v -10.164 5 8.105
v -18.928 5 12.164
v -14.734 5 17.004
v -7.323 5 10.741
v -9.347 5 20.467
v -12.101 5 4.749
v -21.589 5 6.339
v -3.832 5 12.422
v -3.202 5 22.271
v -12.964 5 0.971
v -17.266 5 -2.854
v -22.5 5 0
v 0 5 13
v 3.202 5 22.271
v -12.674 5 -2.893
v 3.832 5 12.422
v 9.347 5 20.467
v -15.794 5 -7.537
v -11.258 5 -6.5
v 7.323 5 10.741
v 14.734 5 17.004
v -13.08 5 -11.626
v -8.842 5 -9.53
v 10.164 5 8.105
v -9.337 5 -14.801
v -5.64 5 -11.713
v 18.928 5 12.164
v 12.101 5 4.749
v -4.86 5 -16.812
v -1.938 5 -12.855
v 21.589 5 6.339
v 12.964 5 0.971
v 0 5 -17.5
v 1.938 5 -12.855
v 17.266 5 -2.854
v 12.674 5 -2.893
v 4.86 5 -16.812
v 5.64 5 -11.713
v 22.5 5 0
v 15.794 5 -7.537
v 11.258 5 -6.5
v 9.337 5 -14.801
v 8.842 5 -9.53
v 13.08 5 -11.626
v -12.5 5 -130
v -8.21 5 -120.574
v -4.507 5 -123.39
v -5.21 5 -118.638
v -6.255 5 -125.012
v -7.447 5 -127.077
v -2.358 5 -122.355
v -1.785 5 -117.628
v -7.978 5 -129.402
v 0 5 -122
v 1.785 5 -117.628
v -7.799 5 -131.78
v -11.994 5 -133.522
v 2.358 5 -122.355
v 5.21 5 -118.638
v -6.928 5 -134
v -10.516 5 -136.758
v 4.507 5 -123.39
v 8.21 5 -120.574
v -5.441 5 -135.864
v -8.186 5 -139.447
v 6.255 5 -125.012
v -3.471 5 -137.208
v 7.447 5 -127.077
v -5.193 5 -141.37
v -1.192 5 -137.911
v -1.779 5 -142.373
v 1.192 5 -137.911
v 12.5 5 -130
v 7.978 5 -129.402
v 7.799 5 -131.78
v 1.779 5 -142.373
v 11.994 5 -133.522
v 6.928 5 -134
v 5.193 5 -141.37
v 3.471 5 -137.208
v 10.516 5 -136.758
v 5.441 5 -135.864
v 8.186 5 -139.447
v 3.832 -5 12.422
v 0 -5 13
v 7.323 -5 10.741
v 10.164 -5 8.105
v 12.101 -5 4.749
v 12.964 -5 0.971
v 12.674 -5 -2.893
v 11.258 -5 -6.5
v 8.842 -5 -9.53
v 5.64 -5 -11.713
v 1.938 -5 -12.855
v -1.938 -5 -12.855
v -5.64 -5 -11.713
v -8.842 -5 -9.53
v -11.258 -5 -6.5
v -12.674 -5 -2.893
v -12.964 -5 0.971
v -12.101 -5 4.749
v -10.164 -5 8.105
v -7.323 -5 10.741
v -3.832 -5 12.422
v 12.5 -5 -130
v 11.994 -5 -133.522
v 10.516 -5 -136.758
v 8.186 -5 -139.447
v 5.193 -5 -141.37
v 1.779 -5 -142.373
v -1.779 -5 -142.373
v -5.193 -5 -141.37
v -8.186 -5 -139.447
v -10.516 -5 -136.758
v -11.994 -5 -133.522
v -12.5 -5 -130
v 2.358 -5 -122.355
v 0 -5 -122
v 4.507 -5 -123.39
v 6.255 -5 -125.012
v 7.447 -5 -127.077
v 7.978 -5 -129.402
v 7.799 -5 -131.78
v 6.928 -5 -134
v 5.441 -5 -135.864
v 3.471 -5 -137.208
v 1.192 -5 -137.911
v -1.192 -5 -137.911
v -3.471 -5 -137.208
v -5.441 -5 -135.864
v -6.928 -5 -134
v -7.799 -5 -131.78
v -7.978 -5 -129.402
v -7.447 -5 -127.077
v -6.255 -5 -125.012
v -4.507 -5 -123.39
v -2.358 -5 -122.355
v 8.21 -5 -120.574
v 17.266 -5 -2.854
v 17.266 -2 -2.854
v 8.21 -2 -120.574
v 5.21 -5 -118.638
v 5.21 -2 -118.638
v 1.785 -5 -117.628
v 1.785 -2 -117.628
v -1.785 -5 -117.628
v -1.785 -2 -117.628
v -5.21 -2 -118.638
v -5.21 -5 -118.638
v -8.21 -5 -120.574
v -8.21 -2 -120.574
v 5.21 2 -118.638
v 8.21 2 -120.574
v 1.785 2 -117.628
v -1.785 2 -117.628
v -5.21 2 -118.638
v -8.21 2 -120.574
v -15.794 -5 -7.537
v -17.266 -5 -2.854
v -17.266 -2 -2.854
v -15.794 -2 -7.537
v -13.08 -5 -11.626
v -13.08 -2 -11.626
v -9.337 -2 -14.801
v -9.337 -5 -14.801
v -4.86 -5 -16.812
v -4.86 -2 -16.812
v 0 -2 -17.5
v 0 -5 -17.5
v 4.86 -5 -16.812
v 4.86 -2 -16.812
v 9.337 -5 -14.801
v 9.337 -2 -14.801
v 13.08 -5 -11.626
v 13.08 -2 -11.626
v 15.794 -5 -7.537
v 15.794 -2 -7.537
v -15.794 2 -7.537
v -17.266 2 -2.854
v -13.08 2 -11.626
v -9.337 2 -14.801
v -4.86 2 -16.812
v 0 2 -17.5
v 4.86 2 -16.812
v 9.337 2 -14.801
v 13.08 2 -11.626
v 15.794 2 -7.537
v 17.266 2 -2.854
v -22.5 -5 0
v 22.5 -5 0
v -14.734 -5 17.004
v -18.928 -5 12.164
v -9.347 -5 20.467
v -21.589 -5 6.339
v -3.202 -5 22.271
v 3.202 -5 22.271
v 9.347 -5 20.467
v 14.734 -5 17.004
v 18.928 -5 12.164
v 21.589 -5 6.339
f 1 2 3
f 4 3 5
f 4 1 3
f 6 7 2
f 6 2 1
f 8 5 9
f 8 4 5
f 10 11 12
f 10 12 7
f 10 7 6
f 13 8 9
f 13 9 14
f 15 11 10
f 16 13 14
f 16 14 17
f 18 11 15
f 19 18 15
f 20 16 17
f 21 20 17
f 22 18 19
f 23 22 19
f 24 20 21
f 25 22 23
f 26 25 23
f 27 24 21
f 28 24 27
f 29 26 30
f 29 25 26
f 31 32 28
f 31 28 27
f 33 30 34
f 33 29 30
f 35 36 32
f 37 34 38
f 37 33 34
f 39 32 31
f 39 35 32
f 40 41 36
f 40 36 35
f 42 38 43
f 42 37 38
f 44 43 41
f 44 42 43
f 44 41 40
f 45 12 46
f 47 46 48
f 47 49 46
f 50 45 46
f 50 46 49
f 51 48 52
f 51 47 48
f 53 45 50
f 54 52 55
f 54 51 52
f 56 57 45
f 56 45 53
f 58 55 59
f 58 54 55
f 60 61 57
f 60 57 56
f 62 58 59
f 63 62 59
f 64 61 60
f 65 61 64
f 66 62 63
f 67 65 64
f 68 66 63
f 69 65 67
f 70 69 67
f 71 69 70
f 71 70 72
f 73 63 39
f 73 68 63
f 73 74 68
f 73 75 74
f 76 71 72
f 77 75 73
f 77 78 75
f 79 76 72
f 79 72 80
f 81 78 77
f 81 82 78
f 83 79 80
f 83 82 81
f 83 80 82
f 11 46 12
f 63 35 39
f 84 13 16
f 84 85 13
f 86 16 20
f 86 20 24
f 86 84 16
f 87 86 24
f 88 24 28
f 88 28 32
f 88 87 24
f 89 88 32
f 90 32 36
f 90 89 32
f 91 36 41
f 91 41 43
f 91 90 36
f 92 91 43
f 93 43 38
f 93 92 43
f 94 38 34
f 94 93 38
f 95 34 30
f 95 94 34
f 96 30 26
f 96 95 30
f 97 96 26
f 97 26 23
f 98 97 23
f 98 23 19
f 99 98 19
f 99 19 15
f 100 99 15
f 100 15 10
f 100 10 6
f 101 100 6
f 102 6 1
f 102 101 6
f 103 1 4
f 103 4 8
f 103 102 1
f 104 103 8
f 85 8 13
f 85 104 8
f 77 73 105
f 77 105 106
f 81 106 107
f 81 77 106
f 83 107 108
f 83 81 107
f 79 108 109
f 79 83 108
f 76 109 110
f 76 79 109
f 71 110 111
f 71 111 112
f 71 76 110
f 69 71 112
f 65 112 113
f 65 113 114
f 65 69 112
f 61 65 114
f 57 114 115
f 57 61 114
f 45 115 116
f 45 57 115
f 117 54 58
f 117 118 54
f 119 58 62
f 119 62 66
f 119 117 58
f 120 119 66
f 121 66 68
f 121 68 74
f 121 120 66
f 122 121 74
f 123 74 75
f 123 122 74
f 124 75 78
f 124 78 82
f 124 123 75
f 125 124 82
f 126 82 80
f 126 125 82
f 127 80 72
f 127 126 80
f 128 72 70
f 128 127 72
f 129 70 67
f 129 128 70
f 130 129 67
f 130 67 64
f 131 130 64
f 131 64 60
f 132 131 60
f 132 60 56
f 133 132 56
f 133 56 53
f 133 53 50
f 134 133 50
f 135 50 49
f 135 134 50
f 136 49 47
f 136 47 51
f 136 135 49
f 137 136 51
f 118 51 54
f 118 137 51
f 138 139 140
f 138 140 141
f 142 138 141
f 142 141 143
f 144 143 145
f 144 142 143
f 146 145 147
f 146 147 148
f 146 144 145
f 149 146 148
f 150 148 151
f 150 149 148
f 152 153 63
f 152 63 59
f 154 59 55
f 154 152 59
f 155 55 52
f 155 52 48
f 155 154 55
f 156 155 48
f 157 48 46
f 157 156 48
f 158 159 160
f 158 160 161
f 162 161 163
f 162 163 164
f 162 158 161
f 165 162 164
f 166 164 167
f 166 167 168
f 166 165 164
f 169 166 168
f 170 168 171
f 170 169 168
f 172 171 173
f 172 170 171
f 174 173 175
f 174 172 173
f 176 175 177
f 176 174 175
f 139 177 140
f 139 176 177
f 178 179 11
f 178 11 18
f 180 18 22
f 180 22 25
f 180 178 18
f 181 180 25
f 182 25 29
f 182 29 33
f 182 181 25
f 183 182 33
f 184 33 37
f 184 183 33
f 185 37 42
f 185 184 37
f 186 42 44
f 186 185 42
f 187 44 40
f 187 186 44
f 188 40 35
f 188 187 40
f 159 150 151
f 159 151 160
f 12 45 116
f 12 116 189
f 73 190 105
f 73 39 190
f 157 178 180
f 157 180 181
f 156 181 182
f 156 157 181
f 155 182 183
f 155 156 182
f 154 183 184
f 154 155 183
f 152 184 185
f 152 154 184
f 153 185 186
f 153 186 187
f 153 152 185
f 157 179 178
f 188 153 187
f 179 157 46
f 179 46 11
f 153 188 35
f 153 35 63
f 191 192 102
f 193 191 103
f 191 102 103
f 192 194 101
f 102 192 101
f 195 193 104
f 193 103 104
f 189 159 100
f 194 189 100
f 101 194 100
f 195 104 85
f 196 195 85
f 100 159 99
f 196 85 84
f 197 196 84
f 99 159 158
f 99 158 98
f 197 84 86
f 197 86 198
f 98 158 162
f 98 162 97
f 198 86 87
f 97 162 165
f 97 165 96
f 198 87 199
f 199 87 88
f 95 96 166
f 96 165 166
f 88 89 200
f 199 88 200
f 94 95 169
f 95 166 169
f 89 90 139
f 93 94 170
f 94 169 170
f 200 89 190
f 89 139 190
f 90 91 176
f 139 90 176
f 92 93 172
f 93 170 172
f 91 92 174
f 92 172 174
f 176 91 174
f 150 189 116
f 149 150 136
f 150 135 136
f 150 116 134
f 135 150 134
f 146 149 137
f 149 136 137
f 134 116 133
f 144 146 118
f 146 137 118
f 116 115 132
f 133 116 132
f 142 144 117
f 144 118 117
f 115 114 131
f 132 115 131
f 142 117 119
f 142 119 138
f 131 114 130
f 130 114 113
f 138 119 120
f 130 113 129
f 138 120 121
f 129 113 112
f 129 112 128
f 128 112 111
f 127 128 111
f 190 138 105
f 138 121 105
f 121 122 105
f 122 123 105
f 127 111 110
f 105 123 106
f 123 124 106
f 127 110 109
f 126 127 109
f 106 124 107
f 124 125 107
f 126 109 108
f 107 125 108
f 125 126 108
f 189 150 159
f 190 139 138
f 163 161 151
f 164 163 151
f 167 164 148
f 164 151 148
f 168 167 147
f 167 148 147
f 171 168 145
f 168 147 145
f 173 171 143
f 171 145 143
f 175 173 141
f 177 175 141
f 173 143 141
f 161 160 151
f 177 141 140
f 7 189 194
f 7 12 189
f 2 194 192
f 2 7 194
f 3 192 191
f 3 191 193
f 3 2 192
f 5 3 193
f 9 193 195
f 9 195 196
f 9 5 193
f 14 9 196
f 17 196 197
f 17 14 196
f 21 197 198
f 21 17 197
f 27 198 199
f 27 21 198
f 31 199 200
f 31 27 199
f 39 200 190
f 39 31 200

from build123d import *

# Parameters (mm, degrees)
SKETCH1_R           = 13
SKETCH1_R_2         = 8
BOSS_EXTRUDE1_DEPTH = 5
CUT_EXTRUDE1_START  = -5
CUT_EXTRUDE1_DEPTH  = 3
CUT_EXTRUDE2_START  = 2
CUT_EXTRUDE2_DEPTH  = 3


with BuildPart() as part:
    # Sketch1 → Boss-Extrude1 (new, symmetric)
    with BuildSketch(Plane(origin=(0, 0, 0), x_dir=(1, 0, 0), z_dir=(0, 1, 0))):
        with BuildLine():
            Line((22.5, 0), (12.5, 130))
            ThreePointArc((12.5, 130), (0, 142.5), (-12.5, 130))
            Line((-12.5, 130), (-22.5, 0))
            ThreePointArc((-22.5, 0), (0, -22.5), (22.5, 0))
        make_face()
        with Locations(Location((0, 0, 0), (0, 0, 270))):
            Circle(SKETCH1_R, mode=Mode.SUBTRACT)
        with Locations(Location((0, 130, 0), (0, 0, 270))):
            Circle(SKETCH1_R_2, mode=Mode.SUBTRACT)
    extrude(amount=BOSS_EXTRUDE1_DEPTH, both=True)

    # Sketch2 → Cut-Extrude1 (cut)
    with BuildSketch(Plane(origin=(0, 0, 0), x_dir=(1, 0, 0), z_dir=(0, 1, 0)).offset(CUT_EXTRUDE1_START)):
        with BuildLine():
            Line((-8.210272961, 120.57442745), (-17.265674906, 2.854202174))
            ThreePointArc((-17.265674906, 2.854202174), (0, 17.5), (17.265674906, 2.854202174))
            Line((17.265674906, 2.854202174), (8.210272961, 120.57442745))
            ThreePointArc((8.210272961, 120.57442745), (0, 117.5), (-8.210272961, 120.57442745))
        make_face()
    extrude(amount=CUT_EXTRUDE1_DEPTH, mode=Mode.SUBTRACT)

    # Sketch2<3> → Cut-Extrude2 (cut)
    with BuildSketch(Plane(origin=(0, 0, 0), x_dir=(1, 0, 0), z_dir=(0, 1, 0)).offset(CUT_EXTRUDE2_START)):
        with BuildLine():
            Line((-8.210272961, 120.57442745), (-17.265674906, 2.854202174))
            ThreePointArc((-17.265674906, 2.854202174), (0, 17.5), (17.265674906, 2.854202174))
            Line((17.265674906, 2.854202174), (8.210272961, 120.57442745))
            ThreePointArc((8.210272961, 120.57442745), (0, 117.5), (-8.210272961, 120.57442745))
        make_face()
    extrude(amount=CUT_EXTRUDE2_DEPTH, mode=Mode.SUBTRACT)


solid = part.part
